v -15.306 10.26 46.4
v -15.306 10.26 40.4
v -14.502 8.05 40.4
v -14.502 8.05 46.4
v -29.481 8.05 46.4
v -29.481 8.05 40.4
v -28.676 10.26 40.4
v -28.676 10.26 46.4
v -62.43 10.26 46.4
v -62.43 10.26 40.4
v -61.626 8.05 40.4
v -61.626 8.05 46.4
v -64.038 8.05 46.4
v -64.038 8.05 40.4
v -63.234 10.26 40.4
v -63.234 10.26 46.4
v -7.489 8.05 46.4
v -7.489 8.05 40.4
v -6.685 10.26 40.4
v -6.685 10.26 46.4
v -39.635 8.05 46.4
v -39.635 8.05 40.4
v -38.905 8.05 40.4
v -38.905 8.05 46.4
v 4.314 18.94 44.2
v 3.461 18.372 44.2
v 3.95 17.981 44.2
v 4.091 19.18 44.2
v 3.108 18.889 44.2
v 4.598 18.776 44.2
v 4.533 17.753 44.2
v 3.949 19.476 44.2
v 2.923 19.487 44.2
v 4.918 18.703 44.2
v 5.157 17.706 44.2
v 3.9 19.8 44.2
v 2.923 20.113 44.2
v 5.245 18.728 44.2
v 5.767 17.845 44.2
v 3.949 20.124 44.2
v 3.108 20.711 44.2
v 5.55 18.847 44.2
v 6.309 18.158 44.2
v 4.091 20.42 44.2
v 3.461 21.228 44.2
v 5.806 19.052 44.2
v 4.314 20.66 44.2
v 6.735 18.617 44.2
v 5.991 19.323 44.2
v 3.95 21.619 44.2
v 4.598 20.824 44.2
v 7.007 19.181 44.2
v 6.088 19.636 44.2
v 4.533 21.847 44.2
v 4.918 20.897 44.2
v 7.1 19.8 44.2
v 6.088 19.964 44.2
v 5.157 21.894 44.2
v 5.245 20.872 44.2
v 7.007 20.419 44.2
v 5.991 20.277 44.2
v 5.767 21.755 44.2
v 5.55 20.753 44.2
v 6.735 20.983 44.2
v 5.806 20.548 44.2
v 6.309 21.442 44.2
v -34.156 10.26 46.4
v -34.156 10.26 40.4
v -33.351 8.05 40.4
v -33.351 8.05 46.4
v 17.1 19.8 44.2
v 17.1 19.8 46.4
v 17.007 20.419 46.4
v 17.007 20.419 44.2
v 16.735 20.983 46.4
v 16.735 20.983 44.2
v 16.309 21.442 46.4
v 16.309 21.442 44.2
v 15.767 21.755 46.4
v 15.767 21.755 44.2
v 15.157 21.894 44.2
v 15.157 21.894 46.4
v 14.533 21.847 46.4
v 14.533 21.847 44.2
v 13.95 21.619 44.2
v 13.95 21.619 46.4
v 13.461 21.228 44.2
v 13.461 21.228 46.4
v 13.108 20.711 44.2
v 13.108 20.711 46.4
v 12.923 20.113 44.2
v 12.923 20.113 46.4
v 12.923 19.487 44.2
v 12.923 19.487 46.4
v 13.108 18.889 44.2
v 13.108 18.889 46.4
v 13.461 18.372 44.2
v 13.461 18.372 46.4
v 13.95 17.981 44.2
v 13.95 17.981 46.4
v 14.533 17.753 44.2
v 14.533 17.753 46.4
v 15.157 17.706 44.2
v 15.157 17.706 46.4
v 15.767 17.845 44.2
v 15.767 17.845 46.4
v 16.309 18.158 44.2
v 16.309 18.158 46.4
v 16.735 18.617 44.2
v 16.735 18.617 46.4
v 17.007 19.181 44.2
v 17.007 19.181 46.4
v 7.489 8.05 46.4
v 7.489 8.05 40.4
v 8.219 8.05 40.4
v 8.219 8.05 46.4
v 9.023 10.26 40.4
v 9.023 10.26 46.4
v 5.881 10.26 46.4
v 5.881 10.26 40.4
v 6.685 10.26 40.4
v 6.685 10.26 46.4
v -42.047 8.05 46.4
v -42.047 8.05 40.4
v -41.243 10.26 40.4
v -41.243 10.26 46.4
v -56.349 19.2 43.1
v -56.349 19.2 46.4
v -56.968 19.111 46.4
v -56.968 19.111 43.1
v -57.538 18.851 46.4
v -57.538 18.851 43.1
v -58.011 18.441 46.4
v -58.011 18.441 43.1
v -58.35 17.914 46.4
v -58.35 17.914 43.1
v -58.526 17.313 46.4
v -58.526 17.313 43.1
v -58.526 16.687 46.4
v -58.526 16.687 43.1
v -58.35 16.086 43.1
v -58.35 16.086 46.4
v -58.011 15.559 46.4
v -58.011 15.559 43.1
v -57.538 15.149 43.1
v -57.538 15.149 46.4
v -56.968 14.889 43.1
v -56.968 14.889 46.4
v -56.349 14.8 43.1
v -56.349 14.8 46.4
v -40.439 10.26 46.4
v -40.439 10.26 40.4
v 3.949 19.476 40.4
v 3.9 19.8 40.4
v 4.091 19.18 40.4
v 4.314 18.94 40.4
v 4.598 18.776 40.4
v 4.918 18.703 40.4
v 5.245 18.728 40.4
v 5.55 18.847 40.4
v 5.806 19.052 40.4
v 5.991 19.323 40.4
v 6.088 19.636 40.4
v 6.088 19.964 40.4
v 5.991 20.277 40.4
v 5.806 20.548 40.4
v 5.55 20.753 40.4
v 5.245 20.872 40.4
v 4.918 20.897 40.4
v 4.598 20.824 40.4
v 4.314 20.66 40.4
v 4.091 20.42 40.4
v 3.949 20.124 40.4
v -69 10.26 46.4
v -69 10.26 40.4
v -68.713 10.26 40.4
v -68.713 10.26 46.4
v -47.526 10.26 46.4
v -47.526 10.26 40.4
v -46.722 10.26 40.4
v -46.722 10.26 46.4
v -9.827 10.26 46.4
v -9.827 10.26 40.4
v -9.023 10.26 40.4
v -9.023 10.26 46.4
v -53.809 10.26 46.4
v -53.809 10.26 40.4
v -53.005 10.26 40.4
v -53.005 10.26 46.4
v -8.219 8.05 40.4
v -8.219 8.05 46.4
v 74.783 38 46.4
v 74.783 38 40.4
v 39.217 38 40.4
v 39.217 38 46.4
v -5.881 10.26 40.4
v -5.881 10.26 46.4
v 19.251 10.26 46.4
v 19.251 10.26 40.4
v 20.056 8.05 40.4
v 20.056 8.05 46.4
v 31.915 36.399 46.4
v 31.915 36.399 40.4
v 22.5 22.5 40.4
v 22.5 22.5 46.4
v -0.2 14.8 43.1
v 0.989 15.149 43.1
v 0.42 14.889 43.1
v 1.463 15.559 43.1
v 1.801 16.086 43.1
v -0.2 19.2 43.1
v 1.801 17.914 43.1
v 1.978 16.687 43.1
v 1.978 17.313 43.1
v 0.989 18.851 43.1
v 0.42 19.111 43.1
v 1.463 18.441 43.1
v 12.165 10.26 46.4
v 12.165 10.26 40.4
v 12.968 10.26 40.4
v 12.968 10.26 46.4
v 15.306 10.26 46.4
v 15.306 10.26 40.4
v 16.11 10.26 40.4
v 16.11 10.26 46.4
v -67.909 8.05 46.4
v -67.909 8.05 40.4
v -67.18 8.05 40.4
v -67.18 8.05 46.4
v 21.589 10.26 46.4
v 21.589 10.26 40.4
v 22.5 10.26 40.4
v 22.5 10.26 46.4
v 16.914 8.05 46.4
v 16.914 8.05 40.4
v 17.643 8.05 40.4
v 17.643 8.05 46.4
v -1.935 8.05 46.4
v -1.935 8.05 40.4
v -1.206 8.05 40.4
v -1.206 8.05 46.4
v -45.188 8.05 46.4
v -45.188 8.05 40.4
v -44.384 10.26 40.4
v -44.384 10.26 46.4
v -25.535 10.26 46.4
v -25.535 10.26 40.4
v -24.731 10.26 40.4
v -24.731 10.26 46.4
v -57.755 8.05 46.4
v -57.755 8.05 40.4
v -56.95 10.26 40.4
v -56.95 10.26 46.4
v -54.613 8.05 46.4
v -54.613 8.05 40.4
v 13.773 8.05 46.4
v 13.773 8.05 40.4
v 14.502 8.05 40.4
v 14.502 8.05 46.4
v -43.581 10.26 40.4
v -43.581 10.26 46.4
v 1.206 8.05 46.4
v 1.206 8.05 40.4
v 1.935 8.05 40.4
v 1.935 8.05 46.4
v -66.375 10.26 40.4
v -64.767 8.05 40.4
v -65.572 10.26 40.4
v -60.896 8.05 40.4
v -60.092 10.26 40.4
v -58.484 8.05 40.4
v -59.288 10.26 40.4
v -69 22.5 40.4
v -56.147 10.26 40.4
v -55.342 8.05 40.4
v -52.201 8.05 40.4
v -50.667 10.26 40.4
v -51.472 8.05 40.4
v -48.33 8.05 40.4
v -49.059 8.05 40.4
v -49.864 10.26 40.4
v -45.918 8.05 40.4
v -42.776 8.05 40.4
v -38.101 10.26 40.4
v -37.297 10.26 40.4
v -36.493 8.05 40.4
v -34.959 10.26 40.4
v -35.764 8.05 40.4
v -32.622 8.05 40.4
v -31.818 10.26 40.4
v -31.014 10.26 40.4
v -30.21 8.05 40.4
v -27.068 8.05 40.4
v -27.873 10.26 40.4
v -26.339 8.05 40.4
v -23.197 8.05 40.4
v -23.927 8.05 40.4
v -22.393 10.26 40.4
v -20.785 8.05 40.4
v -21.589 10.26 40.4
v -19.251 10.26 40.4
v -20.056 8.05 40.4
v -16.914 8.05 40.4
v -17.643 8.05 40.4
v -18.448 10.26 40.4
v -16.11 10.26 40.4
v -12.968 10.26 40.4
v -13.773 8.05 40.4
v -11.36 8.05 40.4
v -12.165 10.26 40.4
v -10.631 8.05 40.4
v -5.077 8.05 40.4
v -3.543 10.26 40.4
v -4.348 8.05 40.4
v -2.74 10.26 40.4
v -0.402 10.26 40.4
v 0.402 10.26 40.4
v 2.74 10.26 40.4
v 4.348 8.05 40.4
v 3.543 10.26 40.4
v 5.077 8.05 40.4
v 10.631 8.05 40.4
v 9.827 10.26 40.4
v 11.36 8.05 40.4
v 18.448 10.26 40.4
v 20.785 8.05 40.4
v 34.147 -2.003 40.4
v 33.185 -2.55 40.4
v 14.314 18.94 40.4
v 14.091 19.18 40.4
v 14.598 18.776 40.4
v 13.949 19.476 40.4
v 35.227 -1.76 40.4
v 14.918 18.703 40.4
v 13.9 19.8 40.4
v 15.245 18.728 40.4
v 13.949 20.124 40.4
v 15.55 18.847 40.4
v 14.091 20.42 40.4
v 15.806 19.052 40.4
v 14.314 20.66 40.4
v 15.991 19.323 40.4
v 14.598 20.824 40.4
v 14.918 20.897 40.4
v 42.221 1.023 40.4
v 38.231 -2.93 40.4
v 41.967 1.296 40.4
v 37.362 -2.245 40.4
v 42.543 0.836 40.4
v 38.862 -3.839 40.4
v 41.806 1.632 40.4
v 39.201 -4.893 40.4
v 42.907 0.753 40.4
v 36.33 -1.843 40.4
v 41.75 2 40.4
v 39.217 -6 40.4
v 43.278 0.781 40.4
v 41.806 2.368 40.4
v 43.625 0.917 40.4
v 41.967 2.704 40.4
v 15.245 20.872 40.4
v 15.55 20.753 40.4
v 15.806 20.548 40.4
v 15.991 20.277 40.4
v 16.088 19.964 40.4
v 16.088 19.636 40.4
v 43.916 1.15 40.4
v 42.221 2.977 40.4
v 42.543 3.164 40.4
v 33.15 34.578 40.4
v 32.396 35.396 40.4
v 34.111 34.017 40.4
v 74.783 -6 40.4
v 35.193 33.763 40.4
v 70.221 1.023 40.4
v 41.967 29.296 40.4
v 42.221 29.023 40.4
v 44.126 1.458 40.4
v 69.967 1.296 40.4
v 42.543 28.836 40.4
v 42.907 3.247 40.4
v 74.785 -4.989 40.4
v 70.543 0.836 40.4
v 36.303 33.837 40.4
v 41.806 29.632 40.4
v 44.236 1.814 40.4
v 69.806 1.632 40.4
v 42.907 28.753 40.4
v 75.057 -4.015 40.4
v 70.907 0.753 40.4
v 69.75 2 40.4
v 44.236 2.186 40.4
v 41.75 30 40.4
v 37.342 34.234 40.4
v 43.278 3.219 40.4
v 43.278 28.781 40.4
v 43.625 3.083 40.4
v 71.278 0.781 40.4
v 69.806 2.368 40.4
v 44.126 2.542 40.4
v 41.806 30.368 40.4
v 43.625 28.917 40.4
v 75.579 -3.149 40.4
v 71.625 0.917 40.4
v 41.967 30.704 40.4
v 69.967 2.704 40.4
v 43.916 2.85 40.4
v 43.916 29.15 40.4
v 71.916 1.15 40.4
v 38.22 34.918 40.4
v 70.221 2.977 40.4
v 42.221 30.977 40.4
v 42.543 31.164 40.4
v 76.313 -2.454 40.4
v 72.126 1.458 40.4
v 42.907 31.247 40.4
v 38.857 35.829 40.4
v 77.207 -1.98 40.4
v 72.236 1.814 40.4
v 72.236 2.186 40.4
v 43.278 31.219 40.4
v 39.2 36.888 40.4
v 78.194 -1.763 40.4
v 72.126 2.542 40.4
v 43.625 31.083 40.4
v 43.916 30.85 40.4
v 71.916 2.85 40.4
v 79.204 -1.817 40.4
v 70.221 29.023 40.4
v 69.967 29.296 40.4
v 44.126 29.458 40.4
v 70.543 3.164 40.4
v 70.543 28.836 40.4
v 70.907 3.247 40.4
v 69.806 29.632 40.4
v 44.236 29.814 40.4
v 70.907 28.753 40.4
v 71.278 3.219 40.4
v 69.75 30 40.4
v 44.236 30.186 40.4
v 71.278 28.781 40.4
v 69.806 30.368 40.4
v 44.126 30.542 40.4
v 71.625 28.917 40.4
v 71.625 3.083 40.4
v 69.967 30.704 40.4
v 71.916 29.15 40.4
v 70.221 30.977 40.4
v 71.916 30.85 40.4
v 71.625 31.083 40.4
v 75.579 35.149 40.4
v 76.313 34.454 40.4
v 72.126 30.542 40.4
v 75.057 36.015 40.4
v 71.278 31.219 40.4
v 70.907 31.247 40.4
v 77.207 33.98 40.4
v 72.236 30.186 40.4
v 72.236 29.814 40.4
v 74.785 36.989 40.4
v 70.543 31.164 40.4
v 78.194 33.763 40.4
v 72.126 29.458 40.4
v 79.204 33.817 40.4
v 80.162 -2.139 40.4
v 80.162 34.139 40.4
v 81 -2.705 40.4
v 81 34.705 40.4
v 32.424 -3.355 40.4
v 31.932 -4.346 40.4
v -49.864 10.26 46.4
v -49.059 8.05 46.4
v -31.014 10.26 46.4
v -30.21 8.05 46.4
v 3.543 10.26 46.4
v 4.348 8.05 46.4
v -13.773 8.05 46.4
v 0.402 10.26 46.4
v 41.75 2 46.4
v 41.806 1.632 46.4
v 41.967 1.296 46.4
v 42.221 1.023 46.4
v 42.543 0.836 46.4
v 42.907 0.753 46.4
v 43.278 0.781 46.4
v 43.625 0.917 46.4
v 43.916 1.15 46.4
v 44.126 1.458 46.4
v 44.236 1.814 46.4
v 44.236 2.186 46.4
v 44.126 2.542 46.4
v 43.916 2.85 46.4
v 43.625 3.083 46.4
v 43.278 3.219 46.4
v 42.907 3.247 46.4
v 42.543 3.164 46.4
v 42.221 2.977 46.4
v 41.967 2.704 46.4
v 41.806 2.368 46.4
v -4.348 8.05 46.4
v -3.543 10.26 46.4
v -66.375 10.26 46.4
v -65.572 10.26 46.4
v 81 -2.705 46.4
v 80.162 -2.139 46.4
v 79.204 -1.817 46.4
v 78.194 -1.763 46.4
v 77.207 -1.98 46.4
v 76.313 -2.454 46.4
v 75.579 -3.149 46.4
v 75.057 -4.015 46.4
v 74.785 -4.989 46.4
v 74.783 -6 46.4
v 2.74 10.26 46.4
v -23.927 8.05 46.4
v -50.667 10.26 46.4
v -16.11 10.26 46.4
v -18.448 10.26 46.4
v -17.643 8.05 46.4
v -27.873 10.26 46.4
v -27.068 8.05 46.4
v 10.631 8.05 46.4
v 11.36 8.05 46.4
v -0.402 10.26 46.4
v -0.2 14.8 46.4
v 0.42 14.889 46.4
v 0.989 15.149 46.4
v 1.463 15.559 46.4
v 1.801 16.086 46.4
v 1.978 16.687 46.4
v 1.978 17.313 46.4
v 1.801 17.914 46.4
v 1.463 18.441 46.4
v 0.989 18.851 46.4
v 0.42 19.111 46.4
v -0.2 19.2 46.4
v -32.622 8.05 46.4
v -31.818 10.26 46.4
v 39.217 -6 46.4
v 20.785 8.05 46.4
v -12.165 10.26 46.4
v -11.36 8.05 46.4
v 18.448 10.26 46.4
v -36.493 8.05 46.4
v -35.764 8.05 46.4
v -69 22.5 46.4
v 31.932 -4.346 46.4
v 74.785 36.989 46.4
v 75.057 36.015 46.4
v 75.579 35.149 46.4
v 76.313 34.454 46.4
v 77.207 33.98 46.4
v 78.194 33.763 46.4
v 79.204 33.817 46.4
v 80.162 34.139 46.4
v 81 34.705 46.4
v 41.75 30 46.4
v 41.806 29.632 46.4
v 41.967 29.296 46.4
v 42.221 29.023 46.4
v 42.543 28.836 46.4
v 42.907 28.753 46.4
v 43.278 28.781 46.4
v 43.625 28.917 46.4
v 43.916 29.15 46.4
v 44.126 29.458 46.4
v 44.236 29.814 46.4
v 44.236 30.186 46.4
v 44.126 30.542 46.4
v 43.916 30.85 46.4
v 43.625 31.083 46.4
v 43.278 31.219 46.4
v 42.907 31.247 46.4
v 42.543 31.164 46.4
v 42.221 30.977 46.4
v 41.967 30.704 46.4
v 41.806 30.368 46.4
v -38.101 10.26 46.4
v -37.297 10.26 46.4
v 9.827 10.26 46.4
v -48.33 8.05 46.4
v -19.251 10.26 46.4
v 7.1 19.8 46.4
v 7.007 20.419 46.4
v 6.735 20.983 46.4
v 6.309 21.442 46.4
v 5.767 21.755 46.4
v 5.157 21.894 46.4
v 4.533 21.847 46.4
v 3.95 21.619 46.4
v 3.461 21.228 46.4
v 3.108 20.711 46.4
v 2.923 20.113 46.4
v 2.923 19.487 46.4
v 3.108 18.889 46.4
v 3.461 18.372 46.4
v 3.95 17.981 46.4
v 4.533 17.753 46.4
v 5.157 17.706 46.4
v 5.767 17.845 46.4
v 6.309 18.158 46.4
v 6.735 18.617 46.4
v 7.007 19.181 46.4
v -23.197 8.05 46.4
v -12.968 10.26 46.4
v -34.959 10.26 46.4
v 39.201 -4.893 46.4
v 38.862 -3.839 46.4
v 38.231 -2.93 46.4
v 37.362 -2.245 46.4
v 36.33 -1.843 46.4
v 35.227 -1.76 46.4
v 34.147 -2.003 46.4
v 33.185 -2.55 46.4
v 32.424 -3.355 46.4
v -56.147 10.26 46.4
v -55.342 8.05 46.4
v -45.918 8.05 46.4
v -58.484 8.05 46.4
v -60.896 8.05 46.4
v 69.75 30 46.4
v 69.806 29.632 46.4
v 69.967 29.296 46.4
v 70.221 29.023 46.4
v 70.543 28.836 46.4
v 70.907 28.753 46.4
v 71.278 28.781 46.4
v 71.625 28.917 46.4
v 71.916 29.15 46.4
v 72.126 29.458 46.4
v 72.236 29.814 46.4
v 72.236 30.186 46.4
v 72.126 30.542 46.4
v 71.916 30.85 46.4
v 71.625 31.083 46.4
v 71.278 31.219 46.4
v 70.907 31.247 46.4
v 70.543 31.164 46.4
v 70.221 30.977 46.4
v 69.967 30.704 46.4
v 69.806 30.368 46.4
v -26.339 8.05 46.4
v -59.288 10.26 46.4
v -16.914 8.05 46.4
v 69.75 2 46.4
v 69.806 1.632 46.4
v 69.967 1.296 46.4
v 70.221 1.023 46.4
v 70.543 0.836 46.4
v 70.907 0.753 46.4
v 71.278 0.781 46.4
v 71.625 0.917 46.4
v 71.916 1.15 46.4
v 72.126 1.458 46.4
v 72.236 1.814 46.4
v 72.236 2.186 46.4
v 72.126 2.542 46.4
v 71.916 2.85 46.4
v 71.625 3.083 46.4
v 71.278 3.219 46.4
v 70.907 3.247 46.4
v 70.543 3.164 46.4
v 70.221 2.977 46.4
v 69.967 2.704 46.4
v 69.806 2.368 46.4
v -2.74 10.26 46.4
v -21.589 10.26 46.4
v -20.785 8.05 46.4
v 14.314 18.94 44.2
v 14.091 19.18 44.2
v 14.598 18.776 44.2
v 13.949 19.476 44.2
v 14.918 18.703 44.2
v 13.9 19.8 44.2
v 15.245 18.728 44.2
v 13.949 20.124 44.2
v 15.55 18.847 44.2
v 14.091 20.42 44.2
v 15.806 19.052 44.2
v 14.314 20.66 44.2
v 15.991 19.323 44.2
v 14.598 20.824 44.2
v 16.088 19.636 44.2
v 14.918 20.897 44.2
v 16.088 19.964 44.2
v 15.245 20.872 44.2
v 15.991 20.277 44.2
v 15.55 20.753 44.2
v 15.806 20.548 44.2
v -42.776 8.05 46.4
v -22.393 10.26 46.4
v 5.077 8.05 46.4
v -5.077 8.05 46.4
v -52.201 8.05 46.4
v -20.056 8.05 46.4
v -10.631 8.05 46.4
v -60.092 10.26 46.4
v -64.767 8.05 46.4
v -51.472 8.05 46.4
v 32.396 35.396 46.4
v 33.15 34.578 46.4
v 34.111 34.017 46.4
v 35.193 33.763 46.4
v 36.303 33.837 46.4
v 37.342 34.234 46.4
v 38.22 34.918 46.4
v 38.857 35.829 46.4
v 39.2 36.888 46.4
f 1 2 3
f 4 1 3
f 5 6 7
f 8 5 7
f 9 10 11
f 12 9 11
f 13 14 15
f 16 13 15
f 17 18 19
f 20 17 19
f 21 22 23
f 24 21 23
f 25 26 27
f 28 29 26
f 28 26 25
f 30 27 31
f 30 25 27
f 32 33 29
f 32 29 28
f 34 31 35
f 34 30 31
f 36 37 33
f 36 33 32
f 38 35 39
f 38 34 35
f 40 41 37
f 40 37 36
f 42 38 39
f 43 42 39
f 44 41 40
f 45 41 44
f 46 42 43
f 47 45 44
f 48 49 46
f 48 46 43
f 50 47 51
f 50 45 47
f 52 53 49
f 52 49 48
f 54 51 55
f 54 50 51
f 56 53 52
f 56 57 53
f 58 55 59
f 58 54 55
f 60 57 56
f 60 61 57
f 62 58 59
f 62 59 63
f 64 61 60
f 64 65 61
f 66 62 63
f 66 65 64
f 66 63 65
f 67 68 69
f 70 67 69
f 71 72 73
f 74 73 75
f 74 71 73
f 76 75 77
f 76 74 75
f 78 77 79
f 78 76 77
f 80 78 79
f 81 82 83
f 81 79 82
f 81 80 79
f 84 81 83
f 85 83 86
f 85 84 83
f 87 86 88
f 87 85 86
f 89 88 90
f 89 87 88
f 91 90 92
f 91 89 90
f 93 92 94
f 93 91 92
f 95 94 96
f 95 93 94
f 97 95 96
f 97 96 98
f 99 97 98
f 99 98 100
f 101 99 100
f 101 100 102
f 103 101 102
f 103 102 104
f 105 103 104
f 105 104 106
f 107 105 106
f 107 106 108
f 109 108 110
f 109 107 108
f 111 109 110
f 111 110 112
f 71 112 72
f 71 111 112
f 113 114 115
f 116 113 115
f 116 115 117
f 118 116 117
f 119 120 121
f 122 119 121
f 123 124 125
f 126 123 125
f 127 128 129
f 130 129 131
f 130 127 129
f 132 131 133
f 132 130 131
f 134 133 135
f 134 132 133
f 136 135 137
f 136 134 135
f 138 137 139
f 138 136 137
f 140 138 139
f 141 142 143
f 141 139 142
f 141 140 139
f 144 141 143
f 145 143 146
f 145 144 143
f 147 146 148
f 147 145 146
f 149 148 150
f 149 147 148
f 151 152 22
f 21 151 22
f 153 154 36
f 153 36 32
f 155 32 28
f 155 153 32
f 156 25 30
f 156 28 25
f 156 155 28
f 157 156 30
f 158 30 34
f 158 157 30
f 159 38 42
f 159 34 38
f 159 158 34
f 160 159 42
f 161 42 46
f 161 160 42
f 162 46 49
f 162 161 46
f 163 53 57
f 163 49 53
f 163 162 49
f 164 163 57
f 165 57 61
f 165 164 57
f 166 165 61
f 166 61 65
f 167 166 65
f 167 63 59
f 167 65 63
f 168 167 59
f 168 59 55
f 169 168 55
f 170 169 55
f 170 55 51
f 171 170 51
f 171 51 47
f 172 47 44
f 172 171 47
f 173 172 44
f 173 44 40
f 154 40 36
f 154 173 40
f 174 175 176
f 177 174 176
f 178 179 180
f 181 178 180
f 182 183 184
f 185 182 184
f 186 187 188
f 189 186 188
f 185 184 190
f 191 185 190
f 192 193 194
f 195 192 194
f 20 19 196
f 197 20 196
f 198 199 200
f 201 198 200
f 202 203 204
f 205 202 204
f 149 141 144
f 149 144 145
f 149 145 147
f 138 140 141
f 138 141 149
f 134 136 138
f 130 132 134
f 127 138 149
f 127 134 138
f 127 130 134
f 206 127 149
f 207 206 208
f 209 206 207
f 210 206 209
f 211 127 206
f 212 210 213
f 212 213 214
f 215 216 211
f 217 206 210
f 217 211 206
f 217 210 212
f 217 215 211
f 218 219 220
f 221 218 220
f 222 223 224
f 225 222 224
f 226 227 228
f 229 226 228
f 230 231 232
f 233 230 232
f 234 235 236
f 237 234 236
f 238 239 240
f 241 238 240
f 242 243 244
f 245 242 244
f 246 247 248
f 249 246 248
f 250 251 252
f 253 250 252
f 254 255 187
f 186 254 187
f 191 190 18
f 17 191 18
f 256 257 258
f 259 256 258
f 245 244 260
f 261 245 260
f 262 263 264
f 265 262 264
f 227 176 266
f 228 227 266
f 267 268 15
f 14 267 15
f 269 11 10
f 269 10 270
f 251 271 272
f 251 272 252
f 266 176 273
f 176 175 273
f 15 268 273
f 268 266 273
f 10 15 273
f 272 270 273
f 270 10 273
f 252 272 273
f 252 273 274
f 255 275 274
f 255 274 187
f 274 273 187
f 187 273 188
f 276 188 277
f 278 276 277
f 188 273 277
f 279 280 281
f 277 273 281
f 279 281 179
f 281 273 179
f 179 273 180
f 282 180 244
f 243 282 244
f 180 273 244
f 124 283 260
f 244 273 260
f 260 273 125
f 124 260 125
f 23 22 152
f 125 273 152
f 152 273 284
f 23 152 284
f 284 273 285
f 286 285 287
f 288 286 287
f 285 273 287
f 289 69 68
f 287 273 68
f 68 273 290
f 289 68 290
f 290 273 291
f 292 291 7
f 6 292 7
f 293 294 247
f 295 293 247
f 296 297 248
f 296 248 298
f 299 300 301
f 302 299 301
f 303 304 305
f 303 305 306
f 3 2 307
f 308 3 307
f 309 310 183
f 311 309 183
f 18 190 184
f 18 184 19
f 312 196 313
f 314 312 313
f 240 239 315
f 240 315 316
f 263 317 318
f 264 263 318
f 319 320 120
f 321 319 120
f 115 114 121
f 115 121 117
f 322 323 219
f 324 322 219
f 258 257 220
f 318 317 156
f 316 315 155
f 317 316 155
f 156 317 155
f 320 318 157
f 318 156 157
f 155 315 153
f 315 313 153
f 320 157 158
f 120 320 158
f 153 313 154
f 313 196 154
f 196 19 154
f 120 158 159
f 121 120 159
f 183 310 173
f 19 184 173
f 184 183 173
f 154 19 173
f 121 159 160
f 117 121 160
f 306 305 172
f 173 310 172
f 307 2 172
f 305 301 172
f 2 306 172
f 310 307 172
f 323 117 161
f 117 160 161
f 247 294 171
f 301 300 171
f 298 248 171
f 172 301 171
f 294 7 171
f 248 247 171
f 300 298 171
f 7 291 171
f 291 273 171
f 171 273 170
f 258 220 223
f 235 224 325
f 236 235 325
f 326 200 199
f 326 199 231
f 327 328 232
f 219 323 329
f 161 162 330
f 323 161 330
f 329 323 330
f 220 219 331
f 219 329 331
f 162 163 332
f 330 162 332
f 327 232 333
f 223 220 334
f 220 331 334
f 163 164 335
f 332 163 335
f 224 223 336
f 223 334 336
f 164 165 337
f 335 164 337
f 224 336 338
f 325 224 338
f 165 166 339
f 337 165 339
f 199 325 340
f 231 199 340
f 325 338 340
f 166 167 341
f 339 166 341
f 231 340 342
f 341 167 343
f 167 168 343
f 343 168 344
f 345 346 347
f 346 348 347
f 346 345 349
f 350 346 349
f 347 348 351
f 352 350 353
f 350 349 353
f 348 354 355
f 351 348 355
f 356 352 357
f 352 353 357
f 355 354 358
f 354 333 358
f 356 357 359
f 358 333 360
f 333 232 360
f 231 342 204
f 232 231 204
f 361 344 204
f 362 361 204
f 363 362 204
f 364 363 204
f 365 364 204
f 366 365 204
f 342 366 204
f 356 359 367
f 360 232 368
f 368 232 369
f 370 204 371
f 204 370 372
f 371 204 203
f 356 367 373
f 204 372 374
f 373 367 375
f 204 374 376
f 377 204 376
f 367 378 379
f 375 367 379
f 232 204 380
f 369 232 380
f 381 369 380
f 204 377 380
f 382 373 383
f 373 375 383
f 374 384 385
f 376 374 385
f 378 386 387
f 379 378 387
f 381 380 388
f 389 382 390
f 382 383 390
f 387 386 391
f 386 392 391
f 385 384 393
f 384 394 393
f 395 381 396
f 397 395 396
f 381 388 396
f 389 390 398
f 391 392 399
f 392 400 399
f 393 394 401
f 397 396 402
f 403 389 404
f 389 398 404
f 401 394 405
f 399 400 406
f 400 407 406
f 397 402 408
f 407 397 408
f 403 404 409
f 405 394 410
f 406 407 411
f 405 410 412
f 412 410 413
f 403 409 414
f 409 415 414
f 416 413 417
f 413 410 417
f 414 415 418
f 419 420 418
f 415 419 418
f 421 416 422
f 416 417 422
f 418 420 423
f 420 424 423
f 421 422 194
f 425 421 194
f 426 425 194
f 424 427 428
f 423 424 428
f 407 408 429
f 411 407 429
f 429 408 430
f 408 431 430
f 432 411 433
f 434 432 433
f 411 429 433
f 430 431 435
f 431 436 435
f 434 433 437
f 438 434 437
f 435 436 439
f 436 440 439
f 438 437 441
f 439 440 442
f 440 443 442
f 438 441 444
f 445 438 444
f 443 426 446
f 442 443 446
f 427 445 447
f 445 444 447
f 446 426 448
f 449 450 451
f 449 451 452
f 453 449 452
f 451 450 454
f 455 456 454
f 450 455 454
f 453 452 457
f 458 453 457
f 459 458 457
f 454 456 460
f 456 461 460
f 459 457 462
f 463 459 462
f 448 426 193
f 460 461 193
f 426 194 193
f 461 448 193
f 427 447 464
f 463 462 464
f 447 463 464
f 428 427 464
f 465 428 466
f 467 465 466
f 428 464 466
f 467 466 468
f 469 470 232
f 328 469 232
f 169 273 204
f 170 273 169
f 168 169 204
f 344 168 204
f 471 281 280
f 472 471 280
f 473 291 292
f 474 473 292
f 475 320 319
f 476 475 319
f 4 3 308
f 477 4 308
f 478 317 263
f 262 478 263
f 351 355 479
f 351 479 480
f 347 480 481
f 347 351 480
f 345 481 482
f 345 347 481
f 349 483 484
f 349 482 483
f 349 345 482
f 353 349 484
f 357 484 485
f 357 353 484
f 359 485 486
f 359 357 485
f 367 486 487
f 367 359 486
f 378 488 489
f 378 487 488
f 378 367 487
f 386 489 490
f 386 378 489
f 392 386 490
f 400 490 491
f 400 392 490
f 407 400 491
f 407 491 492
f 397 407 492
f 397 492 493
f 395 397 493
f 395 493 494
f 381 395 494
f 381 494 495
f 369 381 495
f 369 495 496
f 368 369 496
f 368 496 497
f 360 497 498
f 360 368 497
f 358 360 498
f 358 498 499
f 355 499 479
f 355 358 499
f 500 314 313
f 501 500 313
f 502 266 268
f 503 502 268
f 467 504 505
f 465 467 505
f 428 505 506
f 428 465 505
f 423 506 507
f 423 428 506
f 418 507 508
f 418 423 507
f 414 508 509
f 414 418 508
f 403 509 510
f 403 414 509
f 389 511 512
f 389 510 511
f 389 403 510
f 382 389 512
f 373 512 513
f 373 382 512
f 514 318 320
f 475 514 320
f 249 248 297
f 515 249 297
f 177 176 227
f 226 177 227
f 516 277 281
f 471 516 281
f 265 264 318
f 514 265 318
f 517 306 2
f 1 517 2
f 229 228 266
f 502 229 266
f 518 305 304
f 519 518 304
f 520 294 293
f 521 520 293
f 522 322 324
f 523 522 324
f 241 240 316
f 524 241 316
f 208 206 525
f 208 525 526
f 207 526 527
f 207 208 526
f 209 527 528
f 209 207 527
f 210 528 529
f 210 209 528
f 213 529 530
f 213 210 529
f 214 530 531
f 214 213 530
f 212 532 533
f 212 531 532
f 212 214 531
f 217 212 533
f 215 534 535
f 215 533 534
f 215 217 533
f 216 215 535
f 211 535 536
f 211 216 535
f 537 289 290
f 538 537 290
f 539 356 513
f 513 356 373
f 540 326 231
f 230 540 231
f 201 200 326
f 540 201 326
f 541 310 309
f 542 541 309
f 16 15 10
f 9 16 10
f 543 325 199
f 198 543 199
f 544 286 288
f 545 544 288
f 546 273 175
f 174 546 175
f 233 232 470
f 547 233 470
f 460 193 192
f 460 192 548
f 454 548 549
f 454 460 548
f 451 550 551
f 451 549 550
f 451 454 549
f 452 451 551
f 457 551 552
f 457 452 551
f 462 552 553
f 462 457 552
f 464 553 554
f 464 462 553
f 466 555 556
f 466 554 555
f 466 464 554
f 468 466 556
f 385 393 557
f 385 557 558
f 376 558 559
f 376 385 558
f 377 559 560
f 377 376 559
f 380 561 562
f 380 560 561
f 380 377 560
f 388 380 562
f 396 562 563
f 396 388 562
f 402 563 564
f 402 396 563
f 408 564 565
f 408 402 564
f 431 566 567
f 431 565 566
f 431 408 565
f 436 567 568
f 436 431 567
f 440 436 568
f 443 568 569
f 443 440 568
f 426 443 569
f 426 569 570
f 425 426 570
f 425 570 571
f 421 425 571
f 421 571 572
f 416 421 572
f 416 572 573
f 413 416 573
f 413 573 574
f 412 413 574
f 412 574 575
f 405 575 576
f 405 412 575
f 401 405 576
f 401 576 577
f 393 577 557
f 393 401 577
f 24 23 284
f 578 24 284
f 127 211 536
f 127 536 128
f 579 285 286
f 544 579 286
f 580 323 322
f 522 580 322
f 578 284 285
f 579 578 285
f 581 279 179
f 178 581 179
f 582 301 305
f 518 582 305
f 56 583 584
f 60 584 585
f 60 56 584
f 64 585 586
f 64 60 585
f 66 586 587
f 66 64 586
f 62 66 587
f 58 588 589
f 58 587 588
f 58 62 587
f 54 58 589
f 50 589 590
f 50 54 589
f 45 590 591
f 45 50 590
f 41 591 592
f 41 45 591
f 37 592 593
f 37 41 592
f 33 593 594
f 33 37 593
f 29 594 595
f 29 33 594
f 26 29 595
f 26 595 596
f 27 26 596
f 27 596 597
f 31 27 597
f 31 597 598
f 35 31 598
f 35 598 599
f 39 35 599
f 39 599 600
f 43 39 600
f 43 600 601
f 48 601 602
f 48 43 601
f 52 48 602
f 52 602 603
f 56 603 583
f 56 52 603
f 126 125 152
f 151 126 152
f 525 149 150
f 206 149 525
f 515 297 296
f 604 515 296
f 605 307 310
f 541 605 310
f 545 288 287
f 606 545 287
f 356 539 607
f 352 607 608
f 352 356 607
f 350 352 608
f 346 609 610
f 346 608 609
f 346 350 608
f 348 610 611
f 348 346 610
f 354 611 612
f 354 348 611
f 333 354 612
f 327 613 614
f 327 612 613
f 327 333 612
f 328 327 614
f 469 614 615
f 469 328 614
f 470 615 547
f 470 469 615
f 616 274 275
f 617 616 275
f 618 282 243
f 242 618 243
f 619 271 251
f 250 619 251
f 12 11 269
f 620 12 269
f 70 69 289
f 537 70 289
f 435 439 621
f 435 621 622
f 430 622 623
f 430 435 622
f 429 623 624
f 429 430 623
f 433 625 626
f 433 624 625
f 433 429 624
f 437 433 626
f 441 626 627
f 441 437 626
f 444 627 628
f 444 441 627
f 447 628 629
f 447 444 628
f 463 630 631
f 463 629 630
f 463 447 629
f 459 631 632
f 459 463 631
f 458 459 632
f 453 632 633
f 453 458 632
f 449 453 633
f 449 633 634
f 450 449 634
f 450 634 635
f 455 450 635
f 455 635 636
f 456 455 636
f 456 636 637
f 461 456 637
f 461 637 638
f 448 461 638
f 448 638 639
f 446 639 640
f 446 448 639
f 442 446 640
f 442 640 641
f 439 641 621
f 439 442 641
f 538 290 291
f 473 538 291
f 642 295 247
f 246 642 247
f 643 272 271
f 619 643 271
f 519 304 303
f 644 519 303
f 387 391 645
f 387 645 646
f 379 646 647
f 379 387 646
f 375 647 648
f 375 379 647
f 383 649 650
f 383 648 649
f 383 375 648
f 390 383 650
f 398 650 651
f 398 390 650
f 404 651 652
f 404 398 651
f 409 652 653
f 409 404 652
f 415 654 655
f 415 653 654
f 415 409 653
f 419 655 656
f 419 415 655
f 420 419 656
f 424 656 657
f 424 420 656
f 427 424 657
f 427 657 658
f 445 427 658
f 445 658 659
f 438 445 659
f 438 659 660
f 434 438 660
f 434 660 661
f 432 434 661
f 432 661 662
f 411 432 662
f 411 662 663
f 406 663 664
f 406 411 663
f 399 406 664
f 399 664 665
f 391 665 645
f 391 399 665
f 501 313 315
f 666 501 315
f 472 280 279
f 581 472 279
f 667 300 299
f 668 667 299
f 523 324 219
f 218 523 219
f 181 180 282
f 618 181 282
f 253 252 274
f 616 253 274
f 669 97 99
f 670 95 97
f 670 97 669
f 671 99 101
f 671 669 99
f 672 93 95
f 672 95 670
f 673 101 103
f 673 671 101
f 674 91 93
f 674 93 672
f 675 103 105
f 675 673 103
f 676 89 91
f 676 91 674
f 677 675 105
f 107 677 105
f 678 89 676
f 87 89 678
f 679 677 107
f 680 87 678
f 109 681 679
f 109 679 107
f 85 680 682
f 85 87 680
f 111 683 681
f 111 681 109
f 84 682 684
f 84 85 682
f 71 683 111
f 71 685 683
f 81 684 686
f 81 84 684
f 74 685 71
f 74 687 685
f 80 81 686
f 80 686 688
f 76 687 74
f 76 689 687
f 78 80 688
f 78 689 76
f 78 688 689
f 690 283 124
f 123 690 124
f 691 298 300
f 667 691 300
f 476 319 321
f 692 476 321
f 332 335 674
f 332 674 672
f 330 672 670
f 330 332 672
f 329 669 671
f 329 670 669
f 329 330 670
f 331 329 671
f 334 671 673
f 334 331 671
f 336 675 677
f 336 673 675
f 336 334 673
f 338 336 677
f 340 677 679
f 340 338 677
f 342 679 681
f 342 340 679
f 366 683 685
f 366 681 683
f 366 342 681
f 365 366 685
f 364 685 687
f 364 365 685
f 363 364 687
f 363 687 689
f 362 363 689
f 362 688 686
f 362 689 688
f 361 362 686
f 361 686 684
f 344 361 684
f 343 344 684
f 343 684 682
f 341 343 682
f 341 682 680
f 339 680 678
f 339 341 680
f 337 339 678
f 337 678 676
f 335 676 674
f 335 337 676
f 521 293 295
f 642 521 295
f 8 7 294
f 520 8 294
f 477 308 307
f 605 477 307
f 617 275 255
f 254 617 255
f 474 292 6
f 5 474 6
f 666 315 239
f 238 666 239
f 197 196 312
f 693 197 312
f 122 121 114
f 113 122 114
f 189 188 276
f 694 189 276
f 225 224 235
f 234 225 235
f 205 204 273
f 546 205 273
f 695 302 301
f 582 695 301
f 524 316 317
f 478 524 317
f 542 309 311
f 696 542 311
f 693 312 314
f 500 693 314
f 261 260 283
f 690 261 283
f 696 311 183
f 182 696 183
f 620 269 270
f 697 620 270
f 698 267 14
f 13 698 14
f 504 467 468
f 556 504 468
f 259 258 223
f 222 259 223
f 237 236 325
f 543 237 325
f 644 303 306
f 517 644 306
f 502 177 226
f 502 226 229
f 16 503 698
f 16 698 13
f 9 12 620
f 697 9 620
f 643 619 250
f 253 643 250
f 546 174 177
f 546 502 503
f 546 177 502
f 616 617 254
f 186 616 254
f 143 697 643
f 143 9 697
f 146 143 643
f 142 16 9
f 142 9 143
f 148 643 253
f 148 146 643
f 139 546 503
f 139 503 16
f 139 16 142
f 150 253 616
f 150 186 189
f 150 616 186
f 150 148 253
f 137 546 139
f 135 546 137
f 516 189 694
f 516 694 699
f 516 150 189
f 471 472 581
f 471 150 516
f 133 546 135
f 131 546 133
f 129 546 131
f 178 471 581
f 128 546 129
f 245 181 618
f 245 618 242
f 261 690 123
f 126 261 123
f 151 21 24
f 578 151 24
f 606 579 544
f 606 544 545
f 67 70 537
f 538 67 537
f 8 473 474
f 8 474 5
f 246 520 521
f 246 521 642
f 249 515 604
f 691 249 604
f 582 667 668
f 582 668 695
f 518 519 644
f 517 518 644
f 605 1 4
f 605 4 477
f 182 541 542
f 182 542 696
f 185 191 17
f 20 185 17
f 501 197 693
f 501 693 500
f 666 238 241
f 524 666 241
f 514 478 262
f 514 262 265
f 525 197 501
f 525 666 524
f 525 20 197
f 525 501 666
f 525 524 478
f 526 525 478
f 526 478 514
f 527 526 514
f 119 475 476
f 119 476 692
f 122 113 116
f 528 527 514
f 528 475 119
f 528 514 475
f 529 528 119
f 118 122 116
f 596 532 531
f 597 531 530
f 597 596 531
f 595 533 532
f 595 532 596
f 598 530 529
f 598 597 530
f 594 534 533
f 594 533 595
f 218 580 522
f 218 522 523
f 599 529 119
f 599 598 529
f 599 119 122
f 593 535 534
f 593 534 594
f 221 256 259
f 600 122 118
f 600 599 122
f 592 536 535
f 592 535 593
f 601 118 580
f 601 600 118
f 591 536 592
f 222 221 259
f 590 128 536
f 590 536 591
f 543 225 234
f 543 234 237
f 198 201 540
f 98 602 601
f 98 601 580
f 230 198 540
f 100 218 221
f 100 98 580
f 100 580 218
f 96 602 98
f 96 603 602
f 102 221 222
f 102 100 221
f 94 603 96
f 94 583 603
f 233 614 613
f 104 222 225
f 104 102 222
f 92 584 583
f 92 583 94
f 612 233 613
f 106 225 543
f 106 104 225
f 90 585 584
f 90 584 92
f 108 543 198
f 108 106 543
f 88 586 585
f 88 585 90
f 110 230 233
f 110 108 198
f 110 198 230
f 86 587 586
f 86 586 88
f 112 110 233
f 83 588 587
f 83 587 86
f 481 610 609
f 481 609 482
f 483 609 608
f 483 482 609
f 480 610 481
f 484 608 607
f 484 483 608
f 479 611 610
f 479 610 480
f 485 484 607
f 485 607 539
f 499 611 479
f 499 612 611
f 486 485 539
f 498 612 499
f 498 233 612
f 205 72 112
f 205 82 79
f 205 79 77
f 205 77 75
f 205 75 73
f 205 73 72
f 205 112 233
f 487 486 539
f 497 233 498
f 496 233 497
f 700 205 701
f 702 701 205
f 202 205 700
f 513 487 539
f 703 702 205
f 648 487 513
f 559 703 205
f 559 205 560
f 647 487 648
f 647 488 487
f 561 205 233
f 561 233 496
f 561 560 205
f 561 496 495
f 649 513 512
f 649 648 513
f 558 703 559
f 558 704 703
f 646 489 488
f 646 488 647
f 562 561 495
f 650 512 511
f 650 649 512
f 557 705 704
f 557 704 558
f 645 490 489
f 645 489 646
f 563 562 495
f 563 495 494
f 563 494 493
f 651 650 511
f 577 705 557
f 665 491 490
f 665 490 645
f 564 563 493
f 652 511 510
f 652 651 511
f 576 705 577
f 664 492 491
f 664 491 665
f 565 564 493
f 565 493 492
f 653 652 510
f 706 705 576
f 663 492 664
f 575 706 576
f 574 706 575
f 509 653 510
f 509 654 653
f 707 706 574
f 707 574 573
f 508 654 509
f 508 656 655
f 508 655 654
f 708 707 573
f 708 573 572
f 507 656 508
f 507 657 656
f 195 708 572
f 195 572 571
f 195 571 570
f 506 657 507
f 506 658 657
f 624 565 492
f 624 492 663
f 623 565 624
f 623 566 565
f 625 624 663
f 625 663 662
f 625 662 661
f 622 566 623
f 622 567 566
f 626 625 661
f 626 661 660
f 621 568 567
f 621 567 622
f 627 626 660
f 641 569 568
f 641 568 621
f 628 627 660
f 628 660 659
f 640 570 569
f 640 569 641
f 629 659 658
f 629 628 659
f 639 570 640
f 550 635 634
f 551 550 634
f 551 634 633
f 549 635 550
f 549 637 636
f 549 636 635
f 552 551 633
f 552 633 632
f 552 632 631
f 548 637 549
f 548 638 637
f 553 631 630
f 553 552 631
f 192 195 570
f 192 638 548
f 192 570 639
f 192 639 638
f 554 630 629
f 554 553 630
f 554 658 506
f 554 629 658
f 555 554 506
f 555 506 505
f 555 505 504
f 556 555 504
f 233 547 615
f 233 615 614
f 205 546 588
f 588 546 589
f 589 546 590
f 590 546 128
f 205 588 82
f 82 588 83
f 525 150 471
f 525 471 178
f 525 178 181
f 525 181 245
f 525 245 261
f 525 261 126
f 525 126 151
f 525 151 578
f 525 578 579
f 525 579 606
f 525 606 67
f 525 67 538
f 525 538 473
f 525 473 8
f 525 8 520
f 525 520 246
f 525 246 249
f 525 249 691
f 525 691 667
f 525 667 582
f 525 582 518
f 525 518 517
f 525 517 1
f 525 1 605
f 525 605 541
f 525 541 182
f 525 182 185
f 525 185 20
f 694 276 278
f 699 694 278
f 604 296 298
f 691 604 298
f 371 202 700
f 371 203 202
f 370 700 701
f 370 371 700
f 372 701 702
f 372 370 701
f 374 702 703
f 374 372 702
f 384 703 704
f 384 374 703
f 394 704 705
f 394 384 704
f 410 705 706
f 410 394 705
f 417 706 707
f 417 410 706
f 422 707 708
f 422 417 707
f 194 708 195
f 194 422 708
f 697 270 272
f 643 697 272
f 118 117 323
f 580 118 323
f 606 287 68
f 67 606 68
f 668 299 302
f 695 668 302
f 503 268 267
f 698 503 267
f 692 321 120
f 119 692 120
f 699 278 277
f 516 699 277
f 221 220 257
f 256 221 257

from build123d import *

# Parameters (mm, degrees)
M1_START                                       = 40.4
M1_RACK_WITH_INTEGRAL_48_X_44_MM_SEAT_FL_DEPTH = 6
F_56_55_START                                  = 43.1
F_56_55_MM_STOP_SLOT_DEPTH                     = 3.4
FOUR_START                                     = 40.3
FOUR_M3_SEAT_PILOTS_28_X_28_PITCH_PROF_R       = 1.25
FOUR_M3_SEAT_PILOTS_28_X_28_PITCH_DEPTH        = 6.2
SLIDE_START                                    = 40.3
SLIDE_FASTENER_BORES_PROFILE_R                 = 1.1
SLIDE_FASTENER_BORES_DEPTH                     = 6.2
SLIDE_START_2                                  = 44.2
SLIDE_SCREW_RECESSES_PROFILE_R                 = 2.1
SLIDE_SCREW_RECESSES_DEPTH                     = 2.3
RADAR_START                                    = 40.3
RADAR_MOUNTING_SCREW_TOOL_ACCESS_PROFILE_R     = 3.75
RADAR_MOUNTING_SCREW_TOOL_ACCESS_DEPTH         = 6.2


with BuildPart() as part:
    # M1 rack with integral 48 x 44 mm sea 2 → M1 rack with integral 48 x 44 mm seat fl (new body)
    with BuildSketch(Plane.XY.offset(M1_START)):
        Polygon((-69, 10.26), (-68.713242711, 10.26), (-67.908868493, 8.05), (-67.179615611, 8.05), (-66.375241394, 10.26), (-65.571650057, 10.26), (-64.767275839, 8.05), (-64.038022958, 8.05), (-63.23364874, 10.26), (-62.430057404, 10.26), (-61.625683186, 8.05), (-60.896430304, 8.05), (-60.092056086, 10.26), (-59.28846475, 10.26), (-58.484090532, 8.05), (-57.754837651, 8.05), (-56.950463433, 10.26), (-56.146872096, 10.26), (-55.342497879, 8.05), (-54.613244997, 8.05), (-53.808870779, 10.26), (-53.005279443, 10.26), (-52.200905225, 8.05), (-51.471652343, 8.05), (-50.667278126, 10.26), (-49.863686789, 10.26), (-49.059312572, 8.05), (-48.33005969, 8.05), (-47.525685472, 10.26), (-46.722094136, 10.26), (-45.917719918, 8.05), (-45.188467036, 8.05), (-44.384092819, 10.26), (-43.580501482, 10.26), (-42.776127264, 8.05), (-42.046874383, 8.05), (-41.242500165, 10.26), (-40.438908828, 10.26), (-39.634534611, 8.05), (-38.905281729, 8.05), (-38.100907511, 10.26), (-37.297316175, 10.26), (-36.492941957, 8.05), (-35.763689075, 8.05), (-34.959314858, 10.26), (-34.155723521, 10.26), (-33.351349304, 8.05), (-32.622096422, 8.05), (-31.817722204, 10.26), (-31.014130868, 10.26), (-30.20975665, 8.05), (-29.480503768, 8.05), (-28.676129551, 10.26), (-27.872538214, 10.26), (-27.068163996, 8.05), (-26.338911115, 8.05), (-25.534536897, 10.26), (-24.730945561, 10.26), (-23.926571343, 8.05), (-23.197318461, 8.05), (-22.392944243, 10.26), (-21.589352907, 10.26), (-20.784978689, 8.05), (-20.055725808, 8.05), (-19.25135159, 10.26), (-18.447760253, 10.26), (-17.643386036, 8.05), (-16.914133154, 8.05), (-16.109758936, 10.26), (-15.3061676, 10.26), (-14.501793382, 8.05), (-13.7725405, 8.05), (-12.968166283, 10.26), (-12.164574946, 10.26), (-11.360200728, 8.05), (-10.630947847, 8.05), (-9.826573629, 10.26), (-9.022982293, 10.26), (-8.218608075, 8.05), (-7.489355193, 8.05), (-6.684980975, 10.26), (-5.881389639, 10.26), (-5.077015421, 8.05), (-4.34776254, 8.05), (-3.543388322, 10.26), (-2.739796985, 10.26), (-1.935422768, 8.05), (-1.206169886, 8.05), (-0.401795668, 10.26), (0.401795668, 10.26), (1.206169886, 8.05), (1.935422768, 8.05), (2.739796985, 10.26), (3.543388322, 10.26), (4.34776254, 8.05), (5.077015421, 8.05), (5.881389639, 10.26), (6.684980975, 10.26), (7.489355193, 8.05), (8.218608075, 8.05), (9.022982293, 10.26), (9.826573629, 10.26), (10.630947847, 8.05), (11.360200728, 8.05), (12.164574946, 10.26), (12.968166283, 10.26), (13.7725405, 8.05), (14.501793382, 8.05), (15.3061676, 10.26), (16.109758936, 10.26), (16.914133154, 8.05), (17.643386036, 8.05), (18.447760253, 10.26), (19.25135159, 10.26), (20.055725808, 8.05), (20.784978689, 8.05), (21.589352907, 10.26), (22.5, 10.26), (33, -6), (79, -6), (81, -4), (81, 36), (79, 38), (33, 38), (22.5, 22.5), (-69, 22.5), align=None)
    extrude(amount=M1_RACK_WITH_INTEGRAL_48_X_44_MM_SEAT_FL_DEPTH)

    # 56.55 mm stop slot profile → 56.55 mm stop slot (cut)
    with BuildSketch(Plane.XY.offset(F_56_55_START)):
        with BuildLine():
            Line((-56.348667765, 14.8), (-0.2, 14.8))
            ThreePointArc((-0.2, 14.8), (2, 17), (-0.2, 19.2))
            Line((-0.2, 19.2), (-56.348667765, 19.2))
            ThreePointArc((-56.348667765, 19.2), (-58.548667765, 17), (-56.348667765, 14.8))
        make_face()
    extrude(amount=F_56_55_MM_STOP_SLOT_DEPTH, mode=Mode.SUBTRACT)

    # Four M3 seat pilots - 28 x 28 pitch profile → Four M3 seat pilots - 28 x 28 pitch (cut)
    with BuildSketch(Plane.XY.offset(FOUR_START)):
        with Locations(Location((43, 2, 0), (0, 0, 180))):
            Circle(FOUR_M3_SEAT_PILOTS_28_X_28_PITCH_PROF_R)
        with Locations(Location((43, 30, 0), (0, 0, 180))):
            Circle(FOUR_M3_SEAT_PILOTS_28_X_28_PITCH_PROF_R)
        with Locations(Location((71, 2, 0), (0, 0, 180))):
            Circle(FOUR_M3_SEAT_PILOTS_28_X_28_PITCH_PROF_R)
        with Locations(Location((71, 30, 0), (0, 0, 180))):
            Circle(FOUR_M3_SEAT_PILOTS_28_X_28_PITCH_PROF_R)
    extrude(amount=FOUR_M3_SEAT_PILOTS_28_X_28_PITCH_DEPTH, mode=Mode.SUBTRACT)

    # Slide fastener bores profile → Slide fastener bores (cut)
    with BuildSketch(Plane.XY.offset(SLIDE_START)):
        with Locations(Location((5, 19.8, 0), (0, 0, 180))):
            Circle(SLIDE_FASTENER_BORES_PROFILE_R)
        with Locations(Location((15, 19.8, 0), (0, 0, 180))):
            Circle(SLIDE_FASTENER_BORES_PROFILE_R)
    extrude(amount=SLIDE_FASTENER_BORES_DEPTH, mode=Mode.SUBTRACT)

    # Slide screw recesses profile → Slide screw recesses (cut)
    with BuildSketch(Plane.XY.offset(SLIDE_START_2)):
        with Locations((5, 19.8)):
            Circle(SLIDE_SCREW_RECESSES_PROFILE_R)
        with Locations((15, 19.8)):
            Circle(SLIDE_SCREW_RECESSES_PROFILE_R)
    extrude(amount=SLIDE_SCREW_RECESSES_DEPTH, mode=Mode.SUBTRACT)

    # Radar mounting screw tool access profile → Radar mounting screw tool access (cut)
    with BuildSketch(Plane.XY.offset(RADAR_START)):
        with Locations((35.5, -5.5)):
            Circle(RADAR_MOUNTING_SCREW_TOOL_ACCESS_PROFILE_R)
        with Locations((35.5, 37.5)):
            Circle(RADAR_MOUNTING_SCREW_TOOL_ACCESS_PROFILE_R)
        with Locations((78.5, -5.5)):
            Circle(RADAR_MOUNTING_SCREW_TOOL_ACCESS_PROFILE_R)
        with Locations((78.5, 37.5)):
            Circle(RADAR_MOUNTING_SCREW_TOOL_ACCESS_PROFILE_R)
    extrude(amount=RADAR_MOUNTING_SCREW_TOOL_ACCESS_DEPTH, mode=Mode.SUBTRACT)


solid = part.part
